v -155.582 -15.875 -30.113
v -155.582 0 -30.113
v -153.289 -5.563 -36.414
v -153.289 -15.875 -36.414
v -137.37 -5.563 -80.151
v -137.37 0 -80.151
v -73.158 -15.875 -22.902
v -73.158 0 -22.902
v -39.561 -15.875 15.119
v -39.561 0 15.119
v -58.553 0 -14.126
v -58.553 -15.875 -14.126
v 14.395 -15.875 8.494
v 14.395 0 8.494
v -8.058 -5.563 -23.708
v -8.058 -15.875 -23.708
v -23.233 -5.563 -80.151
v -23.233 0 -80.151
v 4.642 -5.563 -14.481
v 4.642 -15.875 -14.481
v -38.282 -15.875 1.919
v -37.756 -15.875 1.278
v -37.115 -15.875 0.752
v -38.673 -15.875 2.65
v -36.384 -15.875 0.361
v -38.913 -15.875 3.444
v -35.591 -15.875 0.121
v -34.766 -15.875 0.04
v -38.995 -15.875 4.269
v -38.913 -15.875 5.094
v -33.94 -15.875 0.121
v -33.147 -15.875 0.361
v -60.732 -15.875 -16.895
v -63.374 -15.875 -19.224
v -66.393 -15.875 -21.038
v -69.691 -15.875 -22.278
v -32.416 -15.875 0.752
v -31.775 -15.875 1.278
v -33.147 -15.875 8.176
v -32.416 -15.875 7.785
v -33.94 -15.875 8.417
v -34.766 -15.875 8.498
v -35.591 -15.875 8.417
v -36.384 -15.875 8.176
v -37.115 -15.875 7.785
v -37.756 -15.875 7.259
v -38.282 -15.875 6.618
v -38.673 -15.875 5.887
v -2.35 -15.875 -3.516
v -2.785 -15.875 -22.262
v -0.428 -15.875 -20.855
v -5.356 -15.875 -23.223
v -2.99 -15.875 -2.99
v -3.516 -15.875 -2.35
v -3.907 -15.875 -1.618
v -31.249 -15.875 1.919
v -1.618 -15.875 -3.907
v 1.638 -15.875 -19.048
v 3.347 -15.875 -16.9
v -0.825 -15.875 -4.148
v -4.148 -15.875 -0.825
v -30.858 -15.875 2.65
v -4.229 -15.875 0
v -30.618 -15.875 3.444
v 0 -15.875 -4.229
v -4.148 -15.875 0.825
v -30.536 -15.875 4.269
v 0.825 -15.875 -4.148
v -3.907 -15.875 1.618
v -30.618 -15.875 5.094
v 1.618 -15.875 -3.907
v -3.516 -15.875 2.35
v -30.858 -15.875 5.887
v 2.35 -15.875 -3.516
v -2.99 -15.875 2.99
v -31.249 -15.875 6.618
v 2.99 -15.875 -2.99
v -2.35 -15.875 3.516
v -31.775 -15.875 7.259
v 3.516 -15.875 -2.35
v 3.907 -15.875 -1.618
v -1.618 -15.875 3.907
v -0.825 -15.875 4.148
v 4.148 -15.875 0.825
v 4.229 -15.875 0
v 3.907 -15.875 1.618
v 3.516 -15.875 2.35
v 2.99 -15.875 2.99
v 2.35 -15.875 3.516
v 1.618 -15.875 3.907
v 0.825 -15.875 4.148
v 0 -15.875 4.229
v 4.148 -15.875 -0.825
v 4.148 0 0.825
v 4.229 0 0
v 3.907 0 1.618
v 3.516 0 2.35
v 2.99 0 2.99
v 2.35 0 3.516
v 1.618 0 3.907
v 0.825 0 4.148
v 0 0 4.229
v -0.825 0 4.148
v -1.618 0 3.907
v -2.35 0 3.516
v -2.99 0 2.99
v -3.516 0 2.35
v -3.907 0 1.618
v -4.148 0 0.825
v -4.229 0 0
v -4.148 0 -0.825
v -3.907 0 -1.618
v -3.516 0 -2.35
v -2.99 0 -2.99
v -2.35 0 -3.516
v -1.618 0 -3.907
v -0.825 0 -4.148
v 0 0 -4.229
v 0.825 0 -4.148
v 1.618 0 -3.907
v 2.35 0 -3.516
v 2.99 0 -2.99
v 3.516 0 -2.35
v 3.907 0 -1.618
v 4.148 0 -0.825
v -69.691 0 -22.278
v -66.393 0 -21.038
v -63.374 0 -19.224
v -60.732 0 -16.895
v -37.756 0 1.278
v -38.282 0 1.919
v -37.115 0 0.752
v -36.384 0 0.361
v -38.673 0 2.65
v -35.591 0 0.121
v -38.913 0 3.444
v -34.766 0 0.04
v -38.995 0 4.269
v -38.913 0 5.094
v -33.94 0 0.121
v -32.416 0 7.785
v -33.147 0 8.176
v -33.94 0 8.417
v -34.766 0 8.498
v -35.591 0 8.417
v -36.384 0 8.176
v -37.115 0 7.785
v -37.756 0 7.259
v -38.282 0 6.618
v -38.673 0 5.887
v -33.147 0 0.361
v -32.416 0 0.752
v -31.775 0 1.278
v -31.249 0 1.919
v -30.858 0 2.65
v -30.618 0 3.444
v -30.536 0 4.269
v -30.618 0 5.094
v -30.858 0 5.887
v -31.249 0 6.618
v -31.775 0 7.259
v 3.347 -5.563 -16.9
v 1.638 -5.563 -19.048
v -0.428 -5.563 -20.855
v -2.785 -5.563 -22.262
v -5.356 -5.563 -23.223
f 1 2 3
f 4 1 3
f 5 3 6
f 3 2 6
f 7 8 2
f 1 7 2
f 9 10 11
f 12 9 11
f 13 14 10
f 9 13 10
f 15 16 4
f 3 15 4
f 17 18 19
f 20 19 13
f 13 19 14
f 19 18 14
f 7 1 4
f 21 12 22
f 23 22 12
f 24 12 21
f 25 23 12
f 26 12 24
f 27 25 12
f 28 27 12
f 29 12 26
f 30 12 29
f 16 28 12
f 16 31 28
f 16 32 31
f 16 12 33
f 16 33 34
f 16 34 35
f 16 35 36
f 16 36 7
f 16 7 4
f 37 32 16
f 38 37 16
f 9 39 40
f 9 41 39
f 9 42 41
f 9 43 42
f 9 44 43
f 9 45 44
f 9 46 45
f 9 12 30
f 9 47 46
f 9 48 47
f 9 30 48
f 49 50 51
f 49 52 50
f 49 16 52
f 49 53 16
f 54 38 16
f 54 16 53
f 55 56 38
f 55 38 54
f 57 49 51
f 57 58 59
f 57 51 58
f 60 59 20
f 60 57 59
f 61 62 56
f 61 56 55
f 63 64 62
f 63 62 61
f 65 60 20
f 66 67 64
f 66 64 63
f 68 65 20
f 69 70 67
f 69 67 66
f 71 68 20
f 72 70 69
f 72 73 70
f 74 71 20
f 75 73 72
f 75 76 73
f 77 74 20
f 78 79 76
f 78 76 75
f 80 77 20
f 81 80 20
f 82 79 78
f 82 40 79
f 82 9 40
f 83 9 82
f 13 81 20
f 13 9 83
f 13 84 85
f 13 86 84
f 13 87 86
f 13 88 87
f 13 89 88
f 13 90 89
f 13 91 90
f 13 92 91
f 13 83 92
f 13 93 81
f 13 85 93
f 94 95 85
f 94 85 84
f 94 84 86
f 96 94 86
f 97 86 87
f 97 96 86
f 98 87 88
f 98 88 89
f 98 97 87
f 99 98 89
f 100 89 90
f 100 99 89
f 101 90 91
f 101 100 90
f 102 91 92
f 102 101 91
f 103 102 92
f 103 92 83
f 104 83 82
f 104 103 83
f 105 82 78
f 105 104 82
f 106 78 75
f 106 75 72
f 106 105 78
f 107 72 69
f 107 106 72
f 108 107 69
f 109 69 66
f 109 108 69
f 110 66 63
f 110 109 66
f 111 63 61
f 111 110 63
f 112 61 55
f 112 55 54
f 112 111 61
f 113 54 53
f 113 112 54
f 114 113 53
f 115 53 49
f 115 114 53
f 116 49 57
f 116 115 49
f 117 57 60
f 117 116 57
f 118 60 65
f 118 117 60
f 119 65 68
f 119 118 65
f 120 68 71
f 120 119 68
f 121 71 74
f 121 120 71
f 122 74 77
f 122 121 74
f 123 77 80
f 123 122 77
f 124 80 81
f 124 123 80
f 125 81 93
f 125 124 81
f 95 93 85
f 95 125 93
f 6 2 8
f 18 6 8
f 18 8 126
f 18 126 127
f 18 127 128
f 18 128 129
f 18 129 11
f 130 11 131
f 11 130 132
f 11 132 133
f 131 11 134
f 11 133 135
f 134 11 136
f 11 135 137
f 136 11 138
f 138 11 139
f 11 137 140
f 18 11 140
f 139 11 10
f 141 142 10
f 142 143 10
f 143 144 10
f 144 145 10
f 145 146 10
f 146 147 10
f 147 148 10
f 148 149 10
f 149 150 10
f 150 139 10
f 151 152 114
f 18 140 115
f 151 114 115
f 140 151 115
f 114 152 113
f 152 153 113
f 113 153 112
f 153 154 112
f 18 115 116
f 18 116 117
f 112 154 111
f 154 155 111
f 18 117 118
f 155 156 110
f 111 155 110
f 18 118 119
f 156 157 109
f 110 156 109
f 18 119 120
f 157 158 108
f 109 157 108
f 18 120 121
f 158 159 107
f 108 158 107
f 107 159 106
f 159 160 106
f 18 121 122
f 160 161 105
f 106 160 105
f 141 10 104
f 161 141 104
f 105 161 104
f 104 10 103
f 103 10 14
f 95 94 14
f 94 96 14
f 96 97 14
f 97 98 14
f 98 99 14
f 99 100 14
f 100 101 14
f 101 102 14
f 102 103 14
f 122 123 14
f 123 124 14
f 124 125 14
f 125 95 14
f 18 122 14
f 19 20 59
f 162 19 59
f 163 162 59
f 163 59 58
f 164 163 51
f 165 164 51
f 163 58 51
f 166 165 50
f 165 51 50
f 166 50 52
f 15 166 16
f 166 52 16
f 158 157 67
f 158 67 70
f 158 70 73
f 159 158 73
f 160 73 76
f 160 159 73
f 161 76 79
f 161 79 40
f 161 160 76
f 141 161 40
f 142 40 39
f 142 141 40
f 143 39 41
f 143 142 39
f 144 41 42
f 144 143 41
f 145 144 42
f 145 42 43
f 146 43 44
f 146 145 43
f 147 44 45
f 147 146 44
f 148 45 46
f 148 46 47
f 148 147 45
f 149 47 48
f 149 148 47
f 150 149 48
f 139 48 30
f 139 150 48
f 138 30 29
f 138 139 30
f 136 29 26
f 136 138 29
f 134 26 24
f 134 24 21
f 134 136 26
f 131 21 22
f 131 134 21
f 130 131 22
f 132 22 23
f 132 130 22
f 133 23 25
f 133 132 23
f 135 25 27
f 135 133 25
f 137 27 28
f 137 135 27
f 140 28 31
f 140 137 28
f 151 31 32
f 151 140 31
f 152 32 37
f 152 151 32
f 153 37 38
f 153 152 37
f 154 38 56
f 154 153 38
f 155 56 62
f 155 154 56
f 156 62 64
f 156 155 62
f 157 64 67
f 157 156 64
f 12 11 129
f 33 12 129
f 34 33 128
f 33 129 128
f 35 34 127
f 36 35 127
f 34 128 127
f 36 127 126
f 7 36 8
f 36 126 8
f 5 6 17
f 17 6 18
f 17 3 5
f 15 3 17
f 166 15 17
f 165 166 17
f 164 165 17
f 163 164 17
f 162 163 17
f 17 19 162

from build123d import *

# Parameters (mm, degrees)
F0_R     = 4.2291
F1_DEPTH = 15.875
F3_DEPTH = 10.3124


# Not quite as in the source:
# - a feature of the source that left no trace in its solid (it failed there, or was rolled back) is left out


with BuildPart() as f1:
    # F0 (on Front) → F1 (new body)
    with BuildSketch(Plane.XZ):
        with BuildLine():
            Line((14.3947540456, 8.4944370214), (-39.560838545, 15.1193507659))
            Line((-39.560838545, 15.1193507659), (-58.5532654186, -14.1264219546))
            ThreePointArc((-58.5532654186, -14.1264219546), (-64.8424818087, -20.1998476249), (-73.1576066321, -22.9015954566))
            Line((-73.1576066321, -22.9015954566), (-155.5821148258, -30.1128055203))
            Line((-155.5821148258, -30.1128055203), (-137.3697370291, -80.1509022713))
            Line((-137.3697370291, -80.1509022713), (-23.2329600585, -80.1509022713))
            Line((-23.2329600585, -80.1509022713), (14.3947540456, 8.4944370214))
        make_face()
        with Locations((-34.7655170351, 4.2686687437)):
            Circle(F0_R, mode=Mode.SUBTRACT)
        Circle(F0_R, mode=Mode.SUBTRACT)
    extrude(amount=F1_DEPTH)

    # F2 (on face) → F3 (cut)
    with BuildSketch(Plane.XZ.offset(15.875)):
        with BuildLine():
            Line((-8.0578011567, -23.7078415676), (-153.2887042884, -36.4138991852))
            Line((-153.2887042884, -36.4138991852), (-137.3697370291, -80.1509022713))
            Line((-137.3697370291, -80.1509022713), (-23.2329600585, -80.1509022713))
            Line((-23.2329600585, -80.1509022713), (4.6424392905, -14.4805767668))
            ThreePointArc((4.6424392905, -14.4805767668), (-0.4282074312, -20.8552533629), (-8.0578011567, -23.7078415676))
        make_face()
    extrude(amount=-F3_DEPTH, mode=Mode.SUBTRACT)


solid = f1.part
